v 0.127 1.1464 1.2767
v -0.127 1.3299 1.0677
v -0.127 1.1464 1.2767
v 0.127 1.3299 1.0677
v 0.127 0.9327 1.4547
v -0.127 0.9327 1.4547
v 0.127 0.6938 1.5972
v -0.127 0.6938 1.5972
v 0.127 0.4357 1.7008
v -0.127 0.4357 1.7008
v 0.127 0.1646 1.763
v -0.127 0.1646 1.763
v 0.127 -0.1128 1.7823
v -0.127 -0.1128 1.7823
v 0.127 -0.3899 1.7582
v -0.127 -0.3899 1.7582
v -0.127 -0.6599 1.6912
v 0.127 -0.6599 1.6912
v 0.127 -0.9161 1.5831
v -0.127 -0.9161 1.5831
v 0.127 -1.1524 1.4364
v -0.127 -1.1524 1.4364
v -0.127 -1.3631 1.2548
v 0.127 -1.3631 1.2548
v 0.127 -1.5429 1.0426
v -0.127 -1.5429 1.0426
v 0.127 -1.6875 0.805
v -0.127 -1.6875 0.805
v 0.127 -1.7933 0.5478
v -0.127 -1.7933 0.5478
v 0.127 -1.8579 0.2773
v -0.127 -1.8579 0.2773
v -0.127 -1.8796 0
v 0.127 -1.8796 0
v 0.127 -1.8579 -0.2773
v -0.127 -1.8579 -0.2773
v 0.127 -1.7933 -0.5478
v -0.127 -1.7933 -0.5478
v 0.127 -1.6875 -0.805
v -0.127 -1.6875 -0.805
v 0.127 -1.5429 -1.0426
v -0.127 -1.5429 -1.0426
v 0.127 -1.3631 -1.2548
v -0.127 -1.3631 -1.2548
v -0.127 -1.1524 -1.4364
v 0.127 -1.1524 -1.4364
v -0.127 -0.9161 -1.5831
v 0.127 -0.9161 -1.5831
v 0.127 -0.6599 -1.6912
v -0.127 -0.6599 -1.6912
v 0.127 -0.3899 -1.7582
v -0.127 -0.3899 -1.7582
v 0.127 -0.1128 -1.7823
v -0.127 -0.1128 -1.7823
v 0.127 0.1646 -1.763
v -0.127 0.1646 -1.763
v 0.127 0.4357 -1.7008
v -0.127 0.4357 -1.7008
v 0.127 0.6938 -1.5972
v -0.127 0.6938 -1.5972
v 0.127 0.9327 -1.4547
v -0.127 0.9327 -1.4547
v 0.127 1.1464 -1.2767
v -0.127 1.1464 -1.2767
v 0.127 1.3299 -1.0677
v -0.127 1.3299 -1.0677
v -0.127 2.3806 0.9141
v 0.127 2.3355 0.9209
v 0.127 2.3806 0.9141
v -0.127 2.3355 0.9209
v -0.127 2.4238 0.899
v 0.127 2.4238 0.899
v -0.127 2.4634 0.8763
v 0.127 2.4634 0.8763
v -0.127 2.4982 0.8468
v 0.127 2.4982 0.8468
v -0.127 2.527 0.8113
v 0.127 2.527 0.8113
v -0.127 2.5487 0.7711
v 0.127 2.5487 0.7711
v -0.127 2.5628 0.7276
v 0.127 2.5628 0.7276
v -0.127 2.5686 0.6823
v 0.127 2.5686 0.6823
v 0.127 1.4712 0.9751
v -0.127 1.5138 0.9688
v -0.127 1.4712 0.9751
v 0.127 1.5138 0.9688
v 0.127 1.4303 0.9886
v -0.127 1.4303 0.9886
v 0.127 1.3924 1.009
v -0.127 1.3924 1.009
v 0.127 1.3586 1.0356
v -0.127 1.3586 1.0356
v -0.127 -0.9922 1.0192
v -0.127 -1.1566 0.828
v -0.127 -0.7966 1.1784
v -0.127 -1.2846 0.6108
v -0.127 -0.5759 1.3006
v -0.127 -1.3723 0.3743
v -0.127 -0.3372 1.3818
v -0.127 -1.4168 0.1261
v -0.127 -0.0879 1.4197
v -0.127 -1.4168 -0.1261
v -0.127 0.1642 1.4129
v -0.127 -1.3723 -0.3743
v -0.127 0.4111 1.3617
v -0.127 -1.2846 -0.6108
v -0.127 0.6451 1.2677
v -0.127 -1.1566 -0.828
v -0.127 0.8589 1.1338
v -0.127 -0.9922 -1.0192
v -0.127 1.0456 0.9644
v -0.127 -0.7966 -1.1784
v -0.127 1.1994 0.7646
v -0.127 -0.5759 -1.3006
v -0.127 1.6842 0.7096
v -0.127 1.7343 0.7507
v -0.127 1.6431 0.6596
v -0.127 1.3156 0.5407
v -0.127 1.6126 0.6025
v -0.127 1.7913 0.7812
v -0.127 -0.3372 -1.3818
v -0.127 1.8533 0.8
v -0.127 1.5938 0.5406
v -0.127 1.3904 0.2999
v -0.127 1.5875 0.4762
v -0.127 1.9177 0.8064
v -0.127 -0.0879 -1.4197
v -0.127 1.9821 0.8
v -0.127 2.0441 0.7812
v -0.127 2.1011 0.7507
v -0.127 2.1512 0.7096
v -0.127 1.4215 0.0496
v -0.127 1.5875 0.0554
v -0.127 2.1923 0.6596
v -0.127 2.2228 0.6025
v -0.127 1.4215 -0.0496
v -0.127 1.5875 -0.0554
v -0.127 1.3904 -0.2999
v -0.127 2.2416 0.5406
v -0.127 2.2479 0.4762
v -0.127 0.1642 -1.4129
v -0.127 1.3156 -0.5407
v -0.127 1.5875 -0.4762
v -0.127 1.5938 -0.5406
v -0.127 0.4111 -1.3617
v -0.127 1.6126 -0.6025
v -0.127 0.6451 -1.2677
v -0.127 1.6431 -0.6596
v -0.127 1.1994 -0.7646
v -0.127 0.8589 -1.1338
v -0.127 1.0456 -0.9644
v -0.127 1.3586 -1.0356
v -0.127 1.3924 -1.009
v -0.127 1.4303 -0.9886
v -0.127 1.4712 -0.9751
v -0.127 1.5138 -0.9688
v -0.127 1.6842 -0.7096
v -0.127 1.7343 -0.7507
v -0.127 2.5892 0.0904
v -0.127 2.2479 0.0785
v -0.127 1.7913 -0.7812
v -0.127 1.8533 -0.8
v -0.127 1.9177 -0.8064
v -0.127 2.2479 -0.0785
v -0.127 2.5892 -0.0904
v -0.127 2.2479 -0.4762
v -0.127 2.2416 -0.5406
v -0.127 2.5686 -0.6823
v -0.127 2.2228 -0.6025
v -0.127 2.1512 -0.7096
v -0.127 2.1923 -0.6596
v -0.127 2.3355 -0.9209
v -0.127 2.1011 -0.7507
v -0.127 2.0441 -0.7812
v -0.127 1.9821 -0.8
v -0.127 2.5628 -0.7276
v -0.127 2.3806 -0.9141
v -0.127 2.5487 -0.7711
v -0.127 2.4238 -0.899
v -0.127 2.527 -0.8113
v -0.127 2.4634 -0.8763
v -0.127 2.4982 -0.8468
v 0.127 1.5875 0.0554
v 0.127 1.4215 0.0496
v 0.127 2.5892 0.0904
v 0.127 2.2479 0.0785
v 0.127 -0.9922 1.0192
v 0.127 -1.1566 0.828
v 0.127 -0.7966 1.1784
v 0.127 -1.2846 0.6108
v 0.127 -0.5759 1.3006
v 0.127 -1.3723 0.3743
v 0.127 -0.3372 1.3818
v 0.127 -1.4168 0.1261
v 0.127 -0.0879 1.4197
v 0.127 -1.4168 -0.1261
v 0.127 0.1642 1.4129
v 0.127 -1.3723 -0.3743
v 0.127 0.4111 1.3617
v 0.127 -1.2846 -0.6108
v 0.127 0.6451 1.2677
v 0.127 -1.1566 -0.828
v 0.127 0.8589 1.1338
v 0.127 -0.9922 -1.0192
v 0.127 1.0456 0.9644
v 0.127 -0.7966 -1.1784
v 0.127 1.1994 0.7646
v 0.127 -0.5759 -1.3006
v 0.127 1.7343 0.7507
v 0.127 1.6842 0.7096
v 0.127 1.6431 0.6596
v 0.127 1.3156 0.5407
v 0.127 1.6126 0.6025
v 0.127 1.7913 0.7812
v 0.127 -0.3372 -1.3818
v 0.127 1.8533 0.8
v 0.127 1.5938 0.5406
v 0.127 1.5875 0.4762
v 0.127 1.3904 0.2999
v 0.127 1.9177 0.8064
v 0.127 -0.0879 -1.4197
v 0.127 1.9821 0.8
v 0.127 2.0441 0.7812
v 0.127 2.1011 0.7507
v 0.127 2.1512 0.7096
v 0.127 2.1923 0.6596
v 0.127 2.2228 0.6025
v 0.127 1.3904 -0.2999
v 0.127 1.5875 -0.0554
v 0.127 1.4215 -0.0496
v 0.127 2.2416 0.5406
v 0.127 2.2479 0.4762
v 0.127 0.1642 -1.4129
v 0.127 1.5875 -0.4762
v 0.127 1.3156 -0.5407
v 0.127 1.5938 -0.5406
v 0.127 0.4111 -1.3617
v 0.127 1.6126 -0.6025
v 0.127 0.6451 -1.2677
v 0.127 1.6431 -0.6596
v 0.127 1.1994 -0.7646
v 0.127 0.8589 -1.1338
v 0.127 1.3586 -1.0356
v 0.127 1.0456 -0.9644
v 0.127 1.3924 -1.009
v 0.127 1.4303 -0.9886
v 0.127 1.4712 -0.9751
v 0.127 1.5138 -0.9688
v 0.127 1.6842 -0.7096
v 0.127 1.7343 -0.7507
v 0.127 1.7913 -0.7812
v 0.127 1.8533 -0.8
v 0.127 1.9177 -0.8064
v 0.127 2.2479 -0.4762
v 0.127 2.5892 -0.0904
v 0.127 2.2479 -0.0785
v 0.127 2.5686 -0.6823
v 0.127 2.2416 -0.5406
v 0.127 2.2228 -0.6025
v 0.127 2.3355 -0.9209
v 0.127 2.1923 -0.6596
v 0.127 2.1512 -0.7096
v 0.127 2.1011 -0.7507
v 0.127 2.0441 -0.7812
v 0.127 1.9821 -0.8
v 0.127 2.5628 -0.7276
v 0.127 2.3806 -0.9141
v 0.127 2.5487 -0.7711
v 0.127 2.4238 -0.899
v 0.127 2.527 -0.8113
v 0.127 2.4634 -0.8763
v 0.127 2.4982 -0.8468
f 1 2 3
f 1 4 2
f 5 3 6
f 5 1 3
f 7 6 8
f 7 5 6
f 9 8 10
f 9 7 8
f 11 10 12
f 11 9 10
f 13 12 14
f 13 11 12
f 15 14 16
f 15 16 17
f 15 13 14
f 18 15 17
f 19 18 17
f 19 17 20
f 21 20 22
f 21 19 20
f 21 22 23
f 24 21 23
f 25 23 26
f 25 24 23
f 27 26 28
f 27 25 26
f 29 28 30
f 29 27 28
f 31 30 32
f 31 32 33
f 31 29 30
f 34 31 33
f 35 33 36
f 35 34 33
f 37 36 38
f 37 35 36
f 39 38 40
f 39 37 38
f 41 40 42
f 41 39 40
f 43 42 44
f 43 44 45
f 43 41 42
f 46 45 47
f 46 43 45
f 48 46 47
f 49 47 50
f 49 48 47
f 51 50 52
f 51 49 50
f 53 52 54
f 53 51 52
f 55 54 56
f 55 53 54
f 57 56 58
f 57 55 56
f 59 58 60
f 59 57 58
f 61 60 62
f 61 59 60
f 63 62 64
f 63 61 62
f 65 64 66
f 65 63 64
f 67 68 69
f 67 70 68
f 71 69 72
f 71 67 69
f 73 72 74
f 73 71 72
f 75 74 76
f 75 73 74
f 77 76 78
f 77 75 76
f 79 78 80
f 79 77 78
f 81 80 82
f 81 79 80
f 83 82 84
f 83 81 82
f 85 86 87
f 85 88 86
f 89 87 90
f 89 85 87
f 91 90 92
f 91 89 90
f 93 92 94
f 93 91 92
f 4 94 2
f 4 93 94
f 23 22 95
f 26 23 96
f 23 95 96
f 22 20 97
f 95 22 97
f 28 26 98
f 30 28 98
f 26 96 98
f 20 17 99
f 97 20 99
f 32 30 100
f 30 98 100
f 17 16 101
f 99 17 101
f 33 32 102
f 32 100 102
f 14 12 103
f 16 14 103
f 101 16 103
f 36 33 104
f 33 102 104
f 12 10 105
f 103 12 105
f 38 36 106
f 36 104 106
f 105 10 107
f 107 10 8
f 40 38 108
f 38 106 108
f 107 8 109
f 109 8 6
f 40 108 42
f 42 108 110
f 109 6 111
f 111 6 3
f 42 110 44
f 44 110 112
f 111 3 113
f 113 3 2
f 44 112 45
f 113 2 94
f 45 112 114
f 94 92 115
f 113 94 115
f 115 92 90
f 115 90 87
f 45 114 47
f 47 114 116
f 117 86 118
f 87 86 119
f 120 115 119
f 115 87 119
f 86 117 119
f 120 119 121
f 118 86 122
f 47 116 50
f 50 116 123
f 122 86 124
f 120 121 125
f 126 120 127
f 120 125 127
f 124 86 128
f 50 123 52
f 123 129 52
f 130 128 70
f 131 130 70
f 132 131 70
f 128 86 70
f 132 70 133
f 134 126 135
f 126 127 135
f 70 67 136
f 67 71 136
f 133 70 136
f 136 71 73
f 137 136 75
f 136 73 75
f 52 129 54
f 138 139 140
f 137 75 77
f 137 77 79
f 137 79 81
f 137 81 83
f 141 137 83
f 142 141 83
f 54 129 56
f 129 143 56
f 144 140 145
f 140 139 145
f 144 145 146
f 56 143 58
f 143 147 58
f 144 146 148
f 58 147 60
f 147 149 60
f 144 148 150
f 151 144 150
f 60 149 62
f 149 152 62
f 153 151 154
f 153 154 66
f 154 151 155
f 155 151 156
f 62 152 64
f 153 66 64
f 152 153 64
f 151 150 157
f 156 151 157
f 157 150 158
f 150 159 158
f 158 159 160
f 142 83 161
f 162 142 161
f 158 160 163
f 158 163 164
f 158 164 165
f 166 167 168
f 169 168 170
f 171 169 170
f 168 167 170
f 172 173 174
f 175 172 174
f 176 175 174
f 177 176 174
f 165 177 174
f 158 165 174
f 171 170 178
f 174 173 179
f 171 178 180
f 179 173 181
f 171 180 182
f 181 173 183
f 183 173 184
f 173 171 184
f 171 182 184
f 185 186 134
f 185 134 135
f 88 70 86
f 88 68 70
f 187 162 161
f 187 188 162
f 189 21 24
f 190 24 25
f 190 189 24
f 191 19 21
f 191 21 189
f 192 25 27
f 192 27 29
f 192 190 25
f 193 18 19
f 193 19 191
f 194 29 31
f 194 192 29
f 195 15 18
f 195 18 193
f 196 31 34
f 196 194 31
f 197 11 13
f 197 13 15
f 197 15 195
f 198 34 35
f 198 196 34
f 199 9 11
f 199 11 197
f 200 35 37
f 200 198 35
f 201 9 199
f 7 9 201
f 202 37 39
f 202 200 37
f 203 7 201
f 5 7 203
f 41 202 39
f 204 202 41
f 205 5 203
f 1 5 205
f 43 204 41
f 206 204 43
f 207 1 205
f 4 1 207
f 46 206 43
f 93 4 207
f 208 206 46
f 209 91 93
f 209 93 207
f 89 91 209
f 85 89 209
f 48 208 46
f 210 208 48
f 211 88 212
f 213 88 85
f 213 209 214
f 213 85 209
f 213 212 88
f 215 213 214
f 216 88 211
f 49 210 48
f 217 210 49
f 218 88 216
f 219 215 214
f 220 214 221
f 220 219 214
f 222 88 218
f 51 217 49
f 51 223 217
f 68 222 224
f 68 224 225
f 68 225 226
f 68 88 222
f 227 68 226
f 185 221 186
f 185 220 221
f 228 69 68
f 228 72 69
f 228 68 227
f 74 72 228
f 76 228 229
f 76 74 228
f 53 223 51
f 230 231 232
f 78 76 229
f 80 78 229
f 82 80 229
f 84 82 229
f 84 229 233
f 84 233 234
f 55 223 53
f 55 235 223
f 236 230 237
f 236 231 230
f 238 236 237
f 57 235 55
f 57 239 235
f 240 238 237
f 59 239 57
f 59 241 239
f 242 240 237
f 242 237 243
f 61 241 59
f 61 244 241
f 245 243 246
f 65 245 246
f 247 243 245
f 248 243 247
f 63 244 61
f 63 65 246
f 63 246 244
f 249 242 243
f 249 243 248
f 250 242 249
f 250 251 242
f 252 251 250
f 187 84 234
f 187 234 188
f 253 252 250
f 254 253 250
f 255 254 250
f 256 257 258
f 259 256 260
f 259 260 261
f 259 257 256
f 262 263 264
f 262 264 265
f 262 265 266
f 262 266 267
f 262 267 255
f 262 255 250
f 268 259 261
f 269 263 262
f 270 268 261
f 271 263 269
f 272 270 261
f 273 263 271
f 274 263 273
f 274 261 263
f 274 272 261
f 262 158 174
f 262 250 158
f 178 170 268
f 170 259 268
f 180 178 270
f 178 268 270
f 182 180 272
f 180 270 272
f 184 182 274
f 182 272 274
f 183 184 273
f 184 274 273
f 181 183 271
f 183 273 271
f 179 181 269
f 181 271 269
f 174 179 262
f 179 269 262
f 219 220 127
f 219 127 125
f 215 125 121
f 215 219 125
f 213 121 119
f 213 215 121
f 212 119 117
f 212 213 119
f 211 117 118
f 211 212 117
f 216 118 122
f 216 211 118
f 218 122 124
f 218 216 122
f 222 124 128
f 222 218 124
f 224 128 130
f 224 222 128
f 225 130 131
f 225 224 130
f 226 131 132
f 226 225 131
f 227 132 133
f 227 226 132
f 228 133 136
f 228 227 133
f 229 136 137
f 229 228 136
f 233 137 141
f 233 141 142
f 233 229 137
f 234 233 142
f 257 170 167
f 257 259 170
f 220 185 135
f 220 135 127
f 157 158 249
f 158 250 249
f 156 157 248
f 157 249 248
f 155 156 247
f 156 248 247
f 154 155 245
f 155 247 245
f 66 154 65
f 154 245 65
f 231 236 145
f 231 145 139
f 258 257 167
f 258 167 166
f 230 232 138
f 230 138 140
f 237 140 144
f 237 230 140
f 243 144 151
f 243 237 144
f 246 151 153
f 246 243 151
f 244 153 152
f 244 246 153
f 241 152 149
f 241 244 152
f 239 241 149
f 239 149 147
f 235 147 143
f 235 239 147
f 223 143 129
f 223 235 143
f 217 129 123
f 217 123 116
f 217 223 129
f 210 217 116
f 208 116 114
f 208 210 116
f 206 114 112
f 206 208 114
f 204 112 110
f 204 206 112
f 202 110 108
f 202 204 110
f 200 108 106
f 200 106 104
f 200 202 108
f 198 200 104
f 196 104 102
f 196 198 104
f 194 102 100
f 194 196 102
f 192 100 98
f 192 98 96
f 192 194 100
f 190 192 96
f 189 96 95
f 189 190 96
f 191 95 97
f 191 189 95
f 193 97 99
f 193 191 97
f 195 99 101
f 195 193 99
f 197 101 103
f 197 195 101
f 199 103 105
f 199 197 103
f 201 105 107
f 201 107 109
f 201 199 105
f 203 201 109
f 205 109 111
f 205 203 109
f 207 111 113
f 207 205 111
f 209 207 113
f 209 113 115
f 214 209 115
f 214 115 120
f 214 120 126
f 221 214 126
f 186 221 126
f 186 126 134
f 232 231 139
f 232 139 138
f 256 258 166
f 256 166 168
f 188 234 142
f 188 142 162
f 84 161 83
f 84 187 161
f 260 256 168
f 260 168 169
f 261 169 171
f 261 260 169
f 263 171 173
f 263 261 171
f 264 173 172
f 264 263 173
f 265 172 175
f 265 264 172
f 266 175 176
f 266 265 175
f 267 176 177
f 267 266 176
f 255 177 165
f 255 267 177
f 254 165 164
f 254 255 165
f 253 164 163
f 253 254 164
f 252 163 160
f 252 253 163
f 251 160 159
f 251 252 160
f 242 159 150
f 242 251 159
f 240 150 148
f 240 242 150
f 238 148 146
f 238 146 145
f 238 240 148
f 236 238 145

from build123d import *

# Parameters (mm, degrees)
BOSS_EXTRUDE1_DEPTH      = 0.127
BOSS_EXTRUDE1_DEPTH_BACK = 0.127
FILLET1_R                = 0.24765


with BuildPart() as part:
    # Sketch3 → Boss-Extrude1 (new body, two sides)
    with BuildSketch(Plane(origin=(0, 0, 0), x_dir=(0, 0, -1), z_dir=(1, 0, 0))) as boss_extrude1_sk:
        with BuildLine():
            Line((-0.907799386, 2.560678154), (-0.975790746, 1.394258103))
            ThreePointArc((-0.975790746, 1.394258103), (0, -1.8796), (0.975790746, 1.394258103))
            Line((0.975790746, 1.394258103), (0.907799386, 2.560678154))
            Line((0.907799386, 2.560678154), (0.090417616, 2.589221755))
            Line((0.090417616, 2.589221755), (0.078498398, 2.2479))
            Line((0.078498398, 2.2479), (0.476156827, 2.2479))
            ThreePointArc((0.476156827, 2.2479), (0.806356827, 1.9177), (0.476156827, 1.5875))
            Line((0.476156827, 1.5875), (0.055436722, 1.5875))
            Line((0.055436722, 1.5875), (0.049641044, 1.421533512))
            ThreePointArc((0.049641044, 1.421533512), (0, -1.4224), (-0.049641044, 1.421533512))
            Line((-0.049641044, 1.421533512), (-0.055436722, 1.5875))
            Line((-0.055436722, 1.5875), (-0.476156827, 1.5875))
            ThreePointArc((-0.476156827, 1.5875), (-0.806356827, 1.9177), (-0.476156827, 2.2479))
            Line((-0.476156827, 2.2479), (-0.078498398, 2.2479))
            Line((-0.078498398, 2.2479), (-0.090417616, 2.589221755))
            Line((-0.090417616, 2.589221755), (-0.907799386, 2.560678154))
        make_face()
    extrude(amount=BOSS_EXTRUDE1_DEPTH)
    extrude(boss_extrude1_sk.sketch, amount=-BOSS_EXTRUDE1_DEPTH_BACK)

    # Fillet1
    fillet1_edges = [part.edges().sort_by_distance(p)[0] for p in [
        (0, 1.394258103, 0.975790746),
        (0, 2.560678154, 0.907799386),
        (0, 2.560678154, -0.907799386),
        (0, 1.394258103, -0.975790746),
    ]]
    fillet(fillet1_edges, radius=FILLET1_R)


solid = part.part
